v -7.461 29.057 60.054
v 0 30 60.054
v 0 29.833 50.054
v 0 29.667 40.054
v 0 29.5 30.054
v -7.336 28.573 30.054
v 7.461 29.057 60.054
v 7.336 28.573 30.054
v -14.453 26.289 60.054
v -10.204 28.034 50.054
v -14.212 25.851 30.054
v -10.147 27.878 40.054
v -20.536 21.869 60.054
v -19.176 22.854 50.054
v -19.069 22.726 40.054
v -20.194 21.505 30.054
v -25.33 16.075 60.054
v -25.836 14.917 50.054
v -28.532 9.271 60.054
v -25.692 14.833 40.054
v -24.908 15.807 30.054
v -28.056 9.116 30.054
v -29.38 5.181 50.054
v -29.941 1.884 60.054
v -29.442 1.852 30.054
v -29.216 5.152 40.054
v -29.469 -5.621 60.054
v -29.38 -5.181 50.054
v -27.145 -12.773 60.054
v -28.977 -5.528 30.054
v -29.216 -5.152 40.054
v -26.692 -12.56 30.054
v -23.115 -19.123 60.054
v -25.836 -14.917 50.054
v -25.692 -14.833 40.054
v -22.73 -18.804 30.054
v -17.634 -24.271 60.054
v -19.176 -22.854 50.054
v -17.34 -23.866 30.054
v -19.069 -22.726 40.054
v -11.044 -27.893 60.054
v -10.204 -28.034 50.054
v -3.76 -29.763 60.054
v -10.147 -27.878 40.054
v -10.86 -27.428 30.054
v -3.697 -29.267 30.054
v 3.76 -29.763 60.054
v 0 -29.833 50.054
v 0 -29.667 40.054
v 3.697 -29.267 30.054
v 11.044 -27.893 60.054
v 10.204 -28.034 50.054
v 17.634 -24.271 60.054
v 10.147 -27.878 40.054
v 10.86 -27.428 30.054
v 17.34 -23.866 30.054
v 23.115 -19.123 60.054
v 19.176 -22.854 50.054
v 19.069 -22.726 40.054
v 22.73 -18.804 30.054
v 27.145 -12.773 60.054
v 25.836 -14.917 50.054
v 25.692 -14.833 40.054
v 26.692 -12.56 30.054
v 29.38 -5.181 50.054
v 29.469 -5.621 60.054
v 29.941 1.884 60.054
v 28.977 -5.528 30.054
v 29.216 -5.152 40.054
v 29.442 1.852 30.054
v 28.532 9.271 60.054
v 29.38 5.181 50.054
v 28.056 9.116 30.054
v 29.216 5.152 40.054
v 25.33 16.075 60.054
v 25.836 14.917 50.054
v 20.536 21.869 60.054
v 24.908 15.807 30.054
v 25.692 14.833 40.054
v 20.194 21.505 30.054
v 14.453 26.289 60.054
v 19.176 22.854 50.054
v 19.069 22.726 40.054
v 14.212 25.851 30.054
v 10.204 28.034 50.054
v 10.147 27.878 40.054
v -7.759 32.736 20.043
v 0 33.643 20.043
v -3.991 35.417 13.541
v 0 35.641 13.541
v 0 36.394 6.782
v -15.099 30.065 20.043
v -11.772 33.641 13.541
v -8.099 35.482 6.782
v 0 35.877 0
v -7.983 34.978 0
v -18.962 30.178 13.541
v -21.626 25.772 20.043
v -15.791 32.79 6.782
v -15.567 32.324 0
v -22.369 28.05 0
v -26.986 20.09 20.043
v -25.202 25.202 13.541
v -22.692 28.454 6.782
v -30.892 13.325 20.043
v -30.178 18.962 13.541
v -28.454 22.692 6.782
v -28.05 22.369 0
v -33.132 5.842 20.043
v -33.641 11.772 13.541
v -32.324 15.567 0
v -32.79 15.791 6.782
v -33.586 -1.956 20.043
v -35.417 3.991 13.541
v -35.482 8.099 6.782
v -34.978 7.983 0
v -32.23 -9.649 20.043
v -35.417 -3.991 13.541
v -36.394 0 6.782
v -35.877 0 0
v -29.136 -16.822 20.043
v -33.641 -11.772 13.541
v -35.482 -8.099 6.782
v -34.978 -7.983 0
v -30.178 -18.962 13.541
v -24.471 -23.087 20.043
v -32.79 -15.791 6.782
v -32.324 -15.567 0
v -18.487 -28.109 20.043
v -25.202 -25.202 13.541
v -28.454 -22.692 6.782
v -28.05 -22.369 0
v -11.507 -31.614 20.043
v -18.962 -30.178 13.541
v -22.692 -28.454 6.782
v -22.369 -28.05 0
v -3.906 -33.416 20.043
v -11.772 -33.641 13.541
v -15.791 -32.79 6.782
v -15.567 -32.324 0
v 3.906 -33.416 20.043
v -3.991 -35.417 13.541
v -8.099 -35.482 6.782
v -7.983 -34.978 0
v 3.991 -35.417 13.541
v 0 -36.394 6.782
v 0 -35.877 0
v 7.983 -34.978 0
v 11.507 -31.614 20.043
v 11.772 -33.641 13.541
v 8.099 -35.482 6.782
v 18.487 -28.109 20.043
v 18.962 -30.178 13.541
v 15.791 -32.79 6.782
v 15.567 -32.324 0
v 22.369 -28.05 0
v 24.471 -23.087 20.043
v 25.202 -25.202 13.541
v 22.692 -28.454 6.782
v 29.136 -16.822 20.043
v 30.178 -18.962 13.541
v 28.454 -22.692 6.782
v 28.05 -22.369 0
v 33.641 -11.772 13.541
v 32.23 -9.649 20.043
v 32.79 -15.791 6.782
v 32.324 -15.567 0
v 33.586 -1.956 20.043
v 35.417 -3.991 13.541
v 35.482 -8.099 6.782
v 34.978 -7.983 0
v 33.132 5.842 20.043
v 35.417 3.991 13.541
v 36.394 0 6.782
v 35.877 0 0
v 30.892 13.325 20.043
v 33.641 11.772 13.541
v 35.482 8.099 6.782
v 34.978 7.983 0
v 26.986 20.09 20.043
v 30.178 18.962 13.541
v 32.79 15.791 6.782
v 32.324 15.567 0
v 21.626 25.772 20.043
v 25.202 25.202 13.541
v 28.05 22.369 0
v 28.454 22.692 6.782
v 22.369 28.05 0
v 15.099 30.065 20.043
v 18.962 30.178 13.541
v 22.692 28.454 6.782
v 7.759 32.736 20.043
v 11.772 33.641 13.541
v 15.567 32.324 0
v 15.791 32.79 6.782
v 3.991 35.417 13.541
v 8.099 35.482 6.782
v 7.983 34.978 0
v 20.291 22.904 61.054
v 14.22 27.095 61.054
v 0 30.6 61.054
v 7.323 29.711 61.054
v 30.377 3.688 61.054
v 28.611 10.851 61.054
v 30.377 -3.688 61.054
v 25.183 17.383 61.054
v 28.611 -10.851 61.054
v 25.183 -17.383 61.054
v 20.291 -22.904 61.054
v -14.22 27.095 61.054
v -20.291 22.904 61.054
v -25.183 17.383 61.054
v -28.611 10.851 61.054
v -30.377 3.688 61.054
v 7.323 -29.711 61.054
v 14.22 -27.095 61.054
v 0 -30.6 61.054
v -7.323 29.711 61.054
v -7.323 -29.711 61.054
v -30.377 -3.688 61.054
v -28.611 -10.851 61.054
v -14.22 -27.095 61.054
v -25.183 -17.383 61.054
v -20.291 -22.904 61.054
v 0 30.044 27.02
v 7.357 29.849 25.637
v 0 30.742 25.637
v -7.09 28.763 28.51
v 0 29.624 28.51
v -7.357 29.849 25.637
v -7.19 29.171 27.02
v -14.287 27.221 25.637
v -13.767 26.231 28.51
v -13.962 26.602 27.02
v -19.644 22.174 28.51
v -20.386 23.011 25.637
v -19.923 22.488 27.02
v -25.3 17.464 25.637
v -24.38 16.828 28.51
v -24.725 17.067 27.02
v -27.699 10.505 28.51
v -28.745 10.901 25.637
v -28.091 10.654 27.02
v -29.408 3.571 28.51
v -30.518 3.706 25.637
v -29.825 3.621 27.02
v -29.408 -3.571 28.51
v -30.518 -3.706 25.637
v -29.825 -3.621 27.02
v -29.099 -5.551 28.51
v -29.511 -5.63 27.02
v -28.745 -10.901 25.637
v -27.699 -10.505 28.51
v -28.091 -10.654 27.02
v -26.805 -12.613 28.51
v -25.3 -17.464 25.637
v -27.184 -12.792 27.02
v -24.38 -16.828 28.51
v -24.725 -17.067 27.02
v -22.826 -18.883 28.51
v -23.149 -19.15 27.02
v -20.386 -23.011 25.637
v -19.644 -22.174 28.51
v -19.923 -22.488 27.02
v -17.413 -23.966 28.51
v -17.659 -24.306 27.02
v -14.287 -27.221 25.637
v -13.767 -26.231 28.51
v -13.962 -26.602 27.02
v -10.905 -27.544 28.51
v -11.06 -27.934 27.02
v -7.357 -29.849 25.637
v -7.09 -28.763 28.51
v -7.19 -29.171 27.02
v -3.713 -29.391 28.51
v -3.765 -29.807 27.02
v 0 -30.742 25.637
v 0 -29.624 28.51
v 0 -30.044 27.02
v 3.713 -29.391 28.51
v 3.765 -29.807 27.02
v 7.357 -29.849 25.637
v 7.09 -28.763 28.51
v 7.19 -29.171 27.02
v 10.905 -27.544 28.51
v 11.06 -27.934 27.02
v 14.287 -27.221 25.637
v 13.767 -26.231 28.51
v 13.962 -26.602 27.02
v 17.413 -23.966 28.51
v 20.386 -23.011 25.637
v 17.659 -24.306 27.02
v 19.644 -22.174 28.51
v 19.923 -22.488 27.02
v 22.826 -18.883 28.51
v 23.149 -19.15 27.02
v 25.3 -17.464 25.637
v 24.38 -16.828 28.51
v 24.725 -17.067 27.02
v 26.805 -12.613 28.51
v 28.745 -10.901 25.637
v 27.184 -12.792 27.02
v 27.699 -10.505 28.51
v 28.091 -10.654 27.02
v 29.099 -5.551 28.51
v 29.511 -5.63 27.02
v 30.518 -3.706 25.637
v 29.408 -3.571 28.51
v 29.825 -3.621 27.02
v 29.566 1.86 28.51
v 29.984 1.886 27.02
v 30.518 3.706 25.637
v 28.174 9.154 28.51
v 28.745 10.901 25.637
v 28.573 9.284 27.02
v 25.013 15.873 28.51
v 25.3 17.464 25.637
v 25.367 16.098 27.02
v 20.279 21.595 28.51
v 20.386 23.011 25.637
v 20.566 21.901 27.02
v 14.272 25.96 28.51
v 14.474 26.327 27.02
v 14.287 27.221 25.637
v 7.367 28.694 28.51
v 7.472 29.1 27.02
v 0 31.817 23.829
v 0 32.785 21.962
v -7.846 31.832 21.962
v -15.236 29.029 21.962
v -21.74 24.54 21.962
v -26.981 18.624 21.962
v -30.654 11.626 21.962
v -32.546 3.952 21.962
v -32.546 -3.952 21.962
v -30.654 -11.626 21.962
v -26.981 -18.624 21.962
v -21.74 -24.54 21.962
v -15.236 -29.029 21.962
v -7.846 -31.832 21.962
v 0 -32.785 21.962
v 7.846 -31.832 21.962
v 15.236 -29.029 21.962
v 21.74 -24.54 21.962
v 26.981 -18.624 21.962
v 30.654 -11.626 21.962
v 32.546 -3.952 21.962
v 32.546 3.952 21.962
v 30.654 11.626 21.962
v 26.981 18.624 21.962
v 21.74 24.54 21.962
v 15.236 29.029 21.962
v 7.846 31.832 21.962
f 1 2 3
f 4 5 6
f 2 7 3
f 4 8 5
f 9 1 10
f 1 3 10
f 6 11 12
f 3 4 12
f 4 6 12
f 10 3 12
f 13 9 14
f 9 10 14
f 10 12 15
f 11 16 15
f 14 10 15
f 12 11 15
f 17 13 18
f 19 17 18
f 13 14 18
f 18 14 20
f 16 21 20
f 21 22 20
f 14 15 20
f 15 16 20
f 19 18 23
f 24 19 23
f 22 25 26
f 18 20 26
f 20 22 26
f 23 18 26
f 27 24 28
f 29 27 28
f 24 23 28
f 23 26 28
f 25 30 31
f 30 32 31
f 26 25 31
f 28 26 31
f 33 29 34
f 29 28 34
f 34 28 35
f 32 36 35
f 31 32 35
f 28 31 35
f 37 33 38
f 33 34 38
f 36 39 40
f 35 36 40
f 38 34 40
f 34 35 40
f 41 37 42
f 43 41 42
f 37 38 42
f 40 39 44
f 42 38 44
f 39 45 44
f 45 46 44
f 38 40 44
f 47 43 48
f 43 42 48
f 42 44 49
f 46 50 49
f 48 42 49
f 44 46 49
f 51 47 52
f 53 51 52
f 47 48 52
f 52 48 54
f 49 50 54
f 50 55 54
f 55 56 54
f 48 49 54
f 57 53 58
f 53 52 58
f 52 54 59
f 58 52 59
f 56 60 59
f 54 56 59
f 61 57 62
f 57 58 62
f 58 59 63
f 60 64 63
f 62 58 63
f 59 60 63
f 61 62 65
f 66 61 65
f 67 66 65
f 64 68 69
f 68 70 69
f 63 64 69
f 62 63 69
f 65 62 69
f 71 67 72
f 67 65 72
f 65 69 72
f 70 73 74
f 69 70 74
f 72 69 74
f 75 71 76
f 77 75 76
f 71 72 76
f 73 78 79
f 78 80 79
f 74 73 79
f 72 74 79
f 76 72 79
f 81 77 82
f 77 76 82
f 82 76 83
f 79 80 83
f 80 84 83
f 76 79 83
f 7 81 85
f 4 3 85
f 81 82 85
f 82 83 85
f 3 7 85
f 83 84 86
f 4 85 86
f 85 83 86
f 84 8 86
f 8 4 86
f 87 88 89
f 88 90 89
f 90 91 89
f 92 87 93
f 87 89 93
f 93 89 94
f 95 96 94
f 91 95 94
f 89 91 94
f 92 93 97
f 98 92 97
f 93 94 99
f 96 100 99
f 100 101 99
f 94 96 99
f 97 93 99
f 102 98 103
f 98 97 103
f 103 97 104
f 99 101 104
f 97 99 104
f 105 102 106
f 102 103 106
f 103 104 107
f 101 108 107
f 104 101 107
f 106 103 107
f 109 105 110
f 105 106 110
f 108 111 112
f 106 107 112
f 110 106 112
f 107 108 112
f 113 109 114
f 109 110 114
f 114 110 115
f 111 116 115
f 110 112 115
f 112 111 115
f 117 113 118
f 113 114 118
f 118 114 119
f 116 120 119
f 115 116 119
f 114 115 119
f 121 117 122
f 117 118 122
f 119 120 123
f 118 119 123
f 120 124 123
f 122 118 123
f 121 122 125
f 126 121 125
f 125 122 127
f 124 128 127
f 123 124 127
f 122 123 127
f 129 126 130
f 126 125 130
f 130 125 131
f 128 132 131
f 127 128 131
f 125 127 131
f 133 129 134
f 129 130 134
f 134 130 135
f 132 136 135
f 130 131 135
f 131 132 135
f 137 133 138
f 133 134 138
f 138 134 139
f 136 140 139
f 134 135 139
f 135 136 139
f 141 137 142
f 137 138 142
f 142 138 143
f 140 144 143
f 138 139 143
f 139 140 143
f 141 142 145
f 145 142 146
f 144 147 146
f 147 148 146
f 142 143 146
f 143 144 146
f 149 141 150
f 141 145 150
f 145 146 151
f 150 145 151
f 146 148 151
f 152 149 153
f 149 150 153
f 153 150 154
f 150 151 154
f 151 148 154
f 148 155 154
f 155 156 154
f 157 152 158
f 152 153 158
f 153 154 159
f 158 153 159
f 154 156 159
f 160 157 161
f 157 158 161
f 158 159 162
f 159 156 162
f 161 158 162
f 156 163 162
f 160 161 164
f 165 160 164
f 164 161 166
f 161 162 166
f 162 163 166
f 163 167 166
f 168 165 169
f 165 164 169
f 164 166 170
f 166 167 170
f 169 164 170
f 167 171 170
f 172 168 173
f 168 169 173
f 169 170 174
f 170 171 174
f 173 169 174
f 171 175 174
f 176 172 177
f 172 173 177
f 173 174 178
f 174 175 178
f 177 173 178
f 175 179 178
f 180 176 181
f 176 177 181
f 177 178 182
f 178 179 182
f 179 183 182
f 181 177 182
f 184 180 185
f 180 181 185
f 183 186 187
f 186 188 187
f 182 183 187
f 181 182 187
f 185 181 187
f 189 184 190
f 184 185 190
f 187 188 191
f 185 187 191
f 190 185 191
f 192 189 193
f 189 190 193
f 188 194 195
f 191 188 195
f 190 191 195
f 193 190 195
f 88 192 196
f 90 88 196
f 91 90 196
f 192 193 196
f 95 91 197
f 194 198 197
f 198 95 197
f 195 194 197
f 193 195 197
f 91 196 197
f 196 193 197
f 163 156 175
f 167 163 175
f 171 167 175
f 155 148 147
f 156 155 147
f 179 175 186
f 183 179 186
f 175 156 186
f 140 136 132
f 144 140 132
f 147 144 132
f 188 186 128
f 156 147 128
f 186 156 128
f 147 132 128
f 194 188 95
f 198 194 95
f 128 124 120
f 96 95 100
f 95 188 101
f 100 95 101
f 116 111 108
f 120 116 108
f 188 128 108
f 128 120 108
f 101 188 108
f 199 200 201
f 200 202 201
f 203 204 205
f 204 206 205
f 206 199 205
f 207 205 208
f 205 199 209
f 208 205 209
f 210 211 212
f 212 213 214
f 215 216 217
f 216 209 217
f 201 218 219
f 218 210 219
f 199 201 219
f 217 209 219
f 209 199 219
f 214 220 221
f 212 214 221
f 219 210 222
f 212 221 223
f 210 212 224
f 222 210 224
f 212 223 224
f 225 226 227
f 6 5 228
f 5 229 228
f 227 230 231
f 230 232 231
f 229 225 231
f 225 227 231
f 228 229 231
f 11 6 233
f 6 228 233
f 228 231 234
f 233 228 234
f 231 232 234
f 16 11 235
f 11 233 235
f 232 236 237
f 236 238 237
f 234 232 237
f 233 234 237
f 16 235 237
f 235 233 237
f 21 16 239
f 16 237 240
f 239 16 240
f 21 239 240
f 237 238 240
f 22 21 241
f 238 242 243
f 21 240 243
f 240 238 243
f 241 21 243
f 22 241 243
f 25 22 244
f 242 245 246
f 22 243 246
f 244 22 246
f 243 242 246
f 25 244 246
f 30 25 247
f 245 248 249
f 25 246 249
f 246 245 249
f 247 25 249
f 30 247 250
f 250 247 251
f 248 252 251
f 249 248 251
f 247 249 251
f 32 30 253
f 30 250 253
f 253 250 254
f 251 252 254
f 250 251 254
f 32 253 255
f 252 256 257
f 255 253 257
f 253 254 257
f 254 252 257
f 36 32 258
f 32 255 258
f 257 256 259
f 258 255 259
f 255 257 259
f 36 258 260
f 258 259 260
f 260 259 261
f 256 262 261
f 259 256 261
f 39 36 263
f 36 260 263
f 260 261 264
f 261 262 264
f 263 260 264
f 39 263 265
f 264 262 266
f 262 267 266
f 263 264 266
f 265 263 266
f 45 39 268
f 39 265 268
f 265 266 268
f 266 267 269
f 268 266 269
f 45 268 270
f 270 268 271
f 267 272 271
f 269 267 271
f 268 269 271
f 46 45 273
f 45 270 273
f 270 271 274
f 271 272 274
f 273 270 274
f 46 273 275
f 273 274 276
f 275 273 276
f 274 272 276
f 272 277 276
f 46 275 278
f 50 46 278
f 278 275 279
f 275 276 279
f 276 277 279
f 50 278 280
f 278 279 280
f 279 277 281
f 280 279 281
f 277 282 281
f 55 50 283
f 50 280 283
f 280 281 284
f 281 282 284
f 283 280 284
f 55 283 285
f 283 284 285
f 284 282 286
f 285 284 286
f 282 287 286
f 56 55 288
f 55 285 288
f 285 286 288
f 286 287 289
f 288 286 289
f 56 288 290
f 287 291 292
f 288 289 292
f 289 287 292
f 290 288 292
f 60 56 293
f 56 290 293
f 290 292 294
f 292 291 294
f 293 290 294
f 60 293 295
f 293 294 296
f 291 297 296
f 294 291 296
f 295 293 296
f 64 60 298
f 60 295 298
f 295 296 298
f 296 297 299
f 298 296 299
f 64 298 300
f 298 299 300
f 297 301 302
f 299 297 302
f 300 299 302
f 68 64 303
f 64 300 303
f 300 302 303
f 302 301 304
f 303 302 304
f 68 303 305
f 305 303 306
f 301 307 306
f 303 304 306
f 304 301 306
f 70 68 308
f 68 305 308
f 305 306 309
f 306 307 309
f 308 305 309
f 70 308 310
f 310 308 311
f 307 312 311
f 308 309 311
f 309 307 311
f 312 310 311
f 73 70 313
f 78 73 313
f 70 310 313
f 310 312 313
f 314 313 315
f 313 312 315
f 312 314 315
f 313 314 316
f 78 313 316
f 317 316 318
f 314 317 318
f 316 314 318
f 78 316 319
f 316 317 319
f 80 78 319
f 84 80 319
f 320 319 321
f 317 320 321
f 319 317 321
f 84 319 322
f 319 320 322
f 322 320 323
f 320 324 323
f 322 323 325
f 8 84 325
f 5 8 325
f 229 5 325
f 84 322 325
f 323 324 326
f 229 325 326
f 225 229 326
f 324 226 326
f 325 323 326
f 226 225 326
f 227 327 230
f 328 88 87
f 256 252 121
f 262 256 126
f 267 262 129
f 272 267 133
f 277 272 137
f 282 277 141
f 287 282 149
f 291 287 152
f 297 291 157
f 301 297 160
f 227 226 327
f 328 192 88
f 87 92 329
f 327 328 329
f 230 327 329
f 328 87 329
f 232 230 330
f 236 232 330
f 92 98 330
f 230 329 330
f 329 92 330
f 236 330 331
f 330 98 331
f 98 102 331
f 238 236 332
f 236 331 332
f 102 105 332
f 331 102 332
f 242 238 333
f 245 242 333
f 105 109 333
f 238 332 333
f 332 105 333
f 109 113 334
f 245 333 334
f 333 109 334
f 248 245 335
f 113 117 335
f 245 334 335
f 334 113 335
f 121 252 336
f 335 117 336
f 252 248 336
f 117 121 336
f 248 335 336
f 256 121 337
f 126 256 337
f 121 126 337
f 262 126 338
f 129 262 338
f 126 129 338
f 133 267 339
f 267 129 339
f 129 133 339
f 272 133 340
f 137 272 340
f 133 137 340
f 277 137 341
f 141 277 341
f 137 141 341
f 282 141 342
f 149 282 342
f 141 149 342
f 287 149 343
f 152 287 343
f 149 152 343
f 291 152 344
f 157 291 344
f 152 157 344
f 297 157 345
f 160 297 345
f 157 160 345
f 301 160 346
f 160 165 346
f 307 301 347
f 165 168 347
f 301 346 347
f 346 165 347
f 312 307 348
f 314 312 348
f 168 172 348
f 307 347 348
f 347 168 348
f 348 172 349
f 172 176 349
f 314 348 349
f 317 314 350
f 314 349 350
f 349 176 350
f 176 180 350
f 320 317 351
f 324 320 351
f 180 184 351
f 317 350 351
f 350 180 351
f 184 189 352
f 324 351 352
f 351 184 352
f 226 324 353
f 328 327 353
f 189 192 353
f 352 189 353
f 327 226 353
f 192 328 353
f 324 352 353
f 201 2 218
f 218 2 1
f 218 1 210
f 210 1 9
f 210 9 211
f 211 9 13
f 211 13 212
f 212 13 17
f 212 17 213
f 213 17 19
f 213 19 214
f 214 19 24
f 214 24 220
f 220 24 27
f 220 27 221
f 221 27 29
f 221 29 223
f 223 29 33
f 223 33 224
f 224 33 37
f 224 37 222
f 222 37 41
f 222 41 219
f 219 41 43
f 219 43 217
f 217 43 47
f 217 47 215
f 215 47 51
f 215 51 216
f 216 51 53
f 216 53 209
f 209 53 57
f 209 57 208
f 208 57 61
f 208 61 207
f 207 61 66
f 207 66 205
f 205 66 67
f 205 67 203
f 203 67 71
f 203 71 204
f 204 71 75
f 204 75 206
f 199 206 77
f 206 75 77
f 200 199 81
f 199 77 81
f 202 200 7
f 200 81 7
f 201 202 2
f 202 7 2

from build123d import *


with BuildPart() as part:
    # Sketch1 → Revolve1 (revolve)
    with BuildSketch(Plane(origin=(0, 0, 0), x_dir=(0, 0, -1), z_dir=(1, 0, 0))):
        with BuildLine():
            Line((0, 0), (-50.959835356, 0))
            Line((-50.959835356, 0), (-61.054255014, 0))
            Line((-61.054255014, 0), (-61.054255014, 30.599788402))
            Line((-61.054255014, 30.599788402), (-60.054255014, 30))
            Line((-60.054255014, 30), (-30.054255014, 29.5))
            ThreePointArc((-30.054255014, 29.5), (-27.754838856, 29.797720054), (-25.637373582, 30.742332522))
            ThreePointArc((-25.637373582, 30.742332522), (-22.902920152, 32.314145749), (-20.042663952, 33.643343571))
            ThreePointArc((-20.042663952, 33.643343571), (-10.179122164, 36.1760026), (0, 35.877187771))
            Line((0, 35.877187771), (0, 34.862194457))
            Line((0, 34.862194457), (0, 0))
        make_face()
    revolve(axis=Axis((0, 0, 0), (0, 0, 1)))


solid = part.part
